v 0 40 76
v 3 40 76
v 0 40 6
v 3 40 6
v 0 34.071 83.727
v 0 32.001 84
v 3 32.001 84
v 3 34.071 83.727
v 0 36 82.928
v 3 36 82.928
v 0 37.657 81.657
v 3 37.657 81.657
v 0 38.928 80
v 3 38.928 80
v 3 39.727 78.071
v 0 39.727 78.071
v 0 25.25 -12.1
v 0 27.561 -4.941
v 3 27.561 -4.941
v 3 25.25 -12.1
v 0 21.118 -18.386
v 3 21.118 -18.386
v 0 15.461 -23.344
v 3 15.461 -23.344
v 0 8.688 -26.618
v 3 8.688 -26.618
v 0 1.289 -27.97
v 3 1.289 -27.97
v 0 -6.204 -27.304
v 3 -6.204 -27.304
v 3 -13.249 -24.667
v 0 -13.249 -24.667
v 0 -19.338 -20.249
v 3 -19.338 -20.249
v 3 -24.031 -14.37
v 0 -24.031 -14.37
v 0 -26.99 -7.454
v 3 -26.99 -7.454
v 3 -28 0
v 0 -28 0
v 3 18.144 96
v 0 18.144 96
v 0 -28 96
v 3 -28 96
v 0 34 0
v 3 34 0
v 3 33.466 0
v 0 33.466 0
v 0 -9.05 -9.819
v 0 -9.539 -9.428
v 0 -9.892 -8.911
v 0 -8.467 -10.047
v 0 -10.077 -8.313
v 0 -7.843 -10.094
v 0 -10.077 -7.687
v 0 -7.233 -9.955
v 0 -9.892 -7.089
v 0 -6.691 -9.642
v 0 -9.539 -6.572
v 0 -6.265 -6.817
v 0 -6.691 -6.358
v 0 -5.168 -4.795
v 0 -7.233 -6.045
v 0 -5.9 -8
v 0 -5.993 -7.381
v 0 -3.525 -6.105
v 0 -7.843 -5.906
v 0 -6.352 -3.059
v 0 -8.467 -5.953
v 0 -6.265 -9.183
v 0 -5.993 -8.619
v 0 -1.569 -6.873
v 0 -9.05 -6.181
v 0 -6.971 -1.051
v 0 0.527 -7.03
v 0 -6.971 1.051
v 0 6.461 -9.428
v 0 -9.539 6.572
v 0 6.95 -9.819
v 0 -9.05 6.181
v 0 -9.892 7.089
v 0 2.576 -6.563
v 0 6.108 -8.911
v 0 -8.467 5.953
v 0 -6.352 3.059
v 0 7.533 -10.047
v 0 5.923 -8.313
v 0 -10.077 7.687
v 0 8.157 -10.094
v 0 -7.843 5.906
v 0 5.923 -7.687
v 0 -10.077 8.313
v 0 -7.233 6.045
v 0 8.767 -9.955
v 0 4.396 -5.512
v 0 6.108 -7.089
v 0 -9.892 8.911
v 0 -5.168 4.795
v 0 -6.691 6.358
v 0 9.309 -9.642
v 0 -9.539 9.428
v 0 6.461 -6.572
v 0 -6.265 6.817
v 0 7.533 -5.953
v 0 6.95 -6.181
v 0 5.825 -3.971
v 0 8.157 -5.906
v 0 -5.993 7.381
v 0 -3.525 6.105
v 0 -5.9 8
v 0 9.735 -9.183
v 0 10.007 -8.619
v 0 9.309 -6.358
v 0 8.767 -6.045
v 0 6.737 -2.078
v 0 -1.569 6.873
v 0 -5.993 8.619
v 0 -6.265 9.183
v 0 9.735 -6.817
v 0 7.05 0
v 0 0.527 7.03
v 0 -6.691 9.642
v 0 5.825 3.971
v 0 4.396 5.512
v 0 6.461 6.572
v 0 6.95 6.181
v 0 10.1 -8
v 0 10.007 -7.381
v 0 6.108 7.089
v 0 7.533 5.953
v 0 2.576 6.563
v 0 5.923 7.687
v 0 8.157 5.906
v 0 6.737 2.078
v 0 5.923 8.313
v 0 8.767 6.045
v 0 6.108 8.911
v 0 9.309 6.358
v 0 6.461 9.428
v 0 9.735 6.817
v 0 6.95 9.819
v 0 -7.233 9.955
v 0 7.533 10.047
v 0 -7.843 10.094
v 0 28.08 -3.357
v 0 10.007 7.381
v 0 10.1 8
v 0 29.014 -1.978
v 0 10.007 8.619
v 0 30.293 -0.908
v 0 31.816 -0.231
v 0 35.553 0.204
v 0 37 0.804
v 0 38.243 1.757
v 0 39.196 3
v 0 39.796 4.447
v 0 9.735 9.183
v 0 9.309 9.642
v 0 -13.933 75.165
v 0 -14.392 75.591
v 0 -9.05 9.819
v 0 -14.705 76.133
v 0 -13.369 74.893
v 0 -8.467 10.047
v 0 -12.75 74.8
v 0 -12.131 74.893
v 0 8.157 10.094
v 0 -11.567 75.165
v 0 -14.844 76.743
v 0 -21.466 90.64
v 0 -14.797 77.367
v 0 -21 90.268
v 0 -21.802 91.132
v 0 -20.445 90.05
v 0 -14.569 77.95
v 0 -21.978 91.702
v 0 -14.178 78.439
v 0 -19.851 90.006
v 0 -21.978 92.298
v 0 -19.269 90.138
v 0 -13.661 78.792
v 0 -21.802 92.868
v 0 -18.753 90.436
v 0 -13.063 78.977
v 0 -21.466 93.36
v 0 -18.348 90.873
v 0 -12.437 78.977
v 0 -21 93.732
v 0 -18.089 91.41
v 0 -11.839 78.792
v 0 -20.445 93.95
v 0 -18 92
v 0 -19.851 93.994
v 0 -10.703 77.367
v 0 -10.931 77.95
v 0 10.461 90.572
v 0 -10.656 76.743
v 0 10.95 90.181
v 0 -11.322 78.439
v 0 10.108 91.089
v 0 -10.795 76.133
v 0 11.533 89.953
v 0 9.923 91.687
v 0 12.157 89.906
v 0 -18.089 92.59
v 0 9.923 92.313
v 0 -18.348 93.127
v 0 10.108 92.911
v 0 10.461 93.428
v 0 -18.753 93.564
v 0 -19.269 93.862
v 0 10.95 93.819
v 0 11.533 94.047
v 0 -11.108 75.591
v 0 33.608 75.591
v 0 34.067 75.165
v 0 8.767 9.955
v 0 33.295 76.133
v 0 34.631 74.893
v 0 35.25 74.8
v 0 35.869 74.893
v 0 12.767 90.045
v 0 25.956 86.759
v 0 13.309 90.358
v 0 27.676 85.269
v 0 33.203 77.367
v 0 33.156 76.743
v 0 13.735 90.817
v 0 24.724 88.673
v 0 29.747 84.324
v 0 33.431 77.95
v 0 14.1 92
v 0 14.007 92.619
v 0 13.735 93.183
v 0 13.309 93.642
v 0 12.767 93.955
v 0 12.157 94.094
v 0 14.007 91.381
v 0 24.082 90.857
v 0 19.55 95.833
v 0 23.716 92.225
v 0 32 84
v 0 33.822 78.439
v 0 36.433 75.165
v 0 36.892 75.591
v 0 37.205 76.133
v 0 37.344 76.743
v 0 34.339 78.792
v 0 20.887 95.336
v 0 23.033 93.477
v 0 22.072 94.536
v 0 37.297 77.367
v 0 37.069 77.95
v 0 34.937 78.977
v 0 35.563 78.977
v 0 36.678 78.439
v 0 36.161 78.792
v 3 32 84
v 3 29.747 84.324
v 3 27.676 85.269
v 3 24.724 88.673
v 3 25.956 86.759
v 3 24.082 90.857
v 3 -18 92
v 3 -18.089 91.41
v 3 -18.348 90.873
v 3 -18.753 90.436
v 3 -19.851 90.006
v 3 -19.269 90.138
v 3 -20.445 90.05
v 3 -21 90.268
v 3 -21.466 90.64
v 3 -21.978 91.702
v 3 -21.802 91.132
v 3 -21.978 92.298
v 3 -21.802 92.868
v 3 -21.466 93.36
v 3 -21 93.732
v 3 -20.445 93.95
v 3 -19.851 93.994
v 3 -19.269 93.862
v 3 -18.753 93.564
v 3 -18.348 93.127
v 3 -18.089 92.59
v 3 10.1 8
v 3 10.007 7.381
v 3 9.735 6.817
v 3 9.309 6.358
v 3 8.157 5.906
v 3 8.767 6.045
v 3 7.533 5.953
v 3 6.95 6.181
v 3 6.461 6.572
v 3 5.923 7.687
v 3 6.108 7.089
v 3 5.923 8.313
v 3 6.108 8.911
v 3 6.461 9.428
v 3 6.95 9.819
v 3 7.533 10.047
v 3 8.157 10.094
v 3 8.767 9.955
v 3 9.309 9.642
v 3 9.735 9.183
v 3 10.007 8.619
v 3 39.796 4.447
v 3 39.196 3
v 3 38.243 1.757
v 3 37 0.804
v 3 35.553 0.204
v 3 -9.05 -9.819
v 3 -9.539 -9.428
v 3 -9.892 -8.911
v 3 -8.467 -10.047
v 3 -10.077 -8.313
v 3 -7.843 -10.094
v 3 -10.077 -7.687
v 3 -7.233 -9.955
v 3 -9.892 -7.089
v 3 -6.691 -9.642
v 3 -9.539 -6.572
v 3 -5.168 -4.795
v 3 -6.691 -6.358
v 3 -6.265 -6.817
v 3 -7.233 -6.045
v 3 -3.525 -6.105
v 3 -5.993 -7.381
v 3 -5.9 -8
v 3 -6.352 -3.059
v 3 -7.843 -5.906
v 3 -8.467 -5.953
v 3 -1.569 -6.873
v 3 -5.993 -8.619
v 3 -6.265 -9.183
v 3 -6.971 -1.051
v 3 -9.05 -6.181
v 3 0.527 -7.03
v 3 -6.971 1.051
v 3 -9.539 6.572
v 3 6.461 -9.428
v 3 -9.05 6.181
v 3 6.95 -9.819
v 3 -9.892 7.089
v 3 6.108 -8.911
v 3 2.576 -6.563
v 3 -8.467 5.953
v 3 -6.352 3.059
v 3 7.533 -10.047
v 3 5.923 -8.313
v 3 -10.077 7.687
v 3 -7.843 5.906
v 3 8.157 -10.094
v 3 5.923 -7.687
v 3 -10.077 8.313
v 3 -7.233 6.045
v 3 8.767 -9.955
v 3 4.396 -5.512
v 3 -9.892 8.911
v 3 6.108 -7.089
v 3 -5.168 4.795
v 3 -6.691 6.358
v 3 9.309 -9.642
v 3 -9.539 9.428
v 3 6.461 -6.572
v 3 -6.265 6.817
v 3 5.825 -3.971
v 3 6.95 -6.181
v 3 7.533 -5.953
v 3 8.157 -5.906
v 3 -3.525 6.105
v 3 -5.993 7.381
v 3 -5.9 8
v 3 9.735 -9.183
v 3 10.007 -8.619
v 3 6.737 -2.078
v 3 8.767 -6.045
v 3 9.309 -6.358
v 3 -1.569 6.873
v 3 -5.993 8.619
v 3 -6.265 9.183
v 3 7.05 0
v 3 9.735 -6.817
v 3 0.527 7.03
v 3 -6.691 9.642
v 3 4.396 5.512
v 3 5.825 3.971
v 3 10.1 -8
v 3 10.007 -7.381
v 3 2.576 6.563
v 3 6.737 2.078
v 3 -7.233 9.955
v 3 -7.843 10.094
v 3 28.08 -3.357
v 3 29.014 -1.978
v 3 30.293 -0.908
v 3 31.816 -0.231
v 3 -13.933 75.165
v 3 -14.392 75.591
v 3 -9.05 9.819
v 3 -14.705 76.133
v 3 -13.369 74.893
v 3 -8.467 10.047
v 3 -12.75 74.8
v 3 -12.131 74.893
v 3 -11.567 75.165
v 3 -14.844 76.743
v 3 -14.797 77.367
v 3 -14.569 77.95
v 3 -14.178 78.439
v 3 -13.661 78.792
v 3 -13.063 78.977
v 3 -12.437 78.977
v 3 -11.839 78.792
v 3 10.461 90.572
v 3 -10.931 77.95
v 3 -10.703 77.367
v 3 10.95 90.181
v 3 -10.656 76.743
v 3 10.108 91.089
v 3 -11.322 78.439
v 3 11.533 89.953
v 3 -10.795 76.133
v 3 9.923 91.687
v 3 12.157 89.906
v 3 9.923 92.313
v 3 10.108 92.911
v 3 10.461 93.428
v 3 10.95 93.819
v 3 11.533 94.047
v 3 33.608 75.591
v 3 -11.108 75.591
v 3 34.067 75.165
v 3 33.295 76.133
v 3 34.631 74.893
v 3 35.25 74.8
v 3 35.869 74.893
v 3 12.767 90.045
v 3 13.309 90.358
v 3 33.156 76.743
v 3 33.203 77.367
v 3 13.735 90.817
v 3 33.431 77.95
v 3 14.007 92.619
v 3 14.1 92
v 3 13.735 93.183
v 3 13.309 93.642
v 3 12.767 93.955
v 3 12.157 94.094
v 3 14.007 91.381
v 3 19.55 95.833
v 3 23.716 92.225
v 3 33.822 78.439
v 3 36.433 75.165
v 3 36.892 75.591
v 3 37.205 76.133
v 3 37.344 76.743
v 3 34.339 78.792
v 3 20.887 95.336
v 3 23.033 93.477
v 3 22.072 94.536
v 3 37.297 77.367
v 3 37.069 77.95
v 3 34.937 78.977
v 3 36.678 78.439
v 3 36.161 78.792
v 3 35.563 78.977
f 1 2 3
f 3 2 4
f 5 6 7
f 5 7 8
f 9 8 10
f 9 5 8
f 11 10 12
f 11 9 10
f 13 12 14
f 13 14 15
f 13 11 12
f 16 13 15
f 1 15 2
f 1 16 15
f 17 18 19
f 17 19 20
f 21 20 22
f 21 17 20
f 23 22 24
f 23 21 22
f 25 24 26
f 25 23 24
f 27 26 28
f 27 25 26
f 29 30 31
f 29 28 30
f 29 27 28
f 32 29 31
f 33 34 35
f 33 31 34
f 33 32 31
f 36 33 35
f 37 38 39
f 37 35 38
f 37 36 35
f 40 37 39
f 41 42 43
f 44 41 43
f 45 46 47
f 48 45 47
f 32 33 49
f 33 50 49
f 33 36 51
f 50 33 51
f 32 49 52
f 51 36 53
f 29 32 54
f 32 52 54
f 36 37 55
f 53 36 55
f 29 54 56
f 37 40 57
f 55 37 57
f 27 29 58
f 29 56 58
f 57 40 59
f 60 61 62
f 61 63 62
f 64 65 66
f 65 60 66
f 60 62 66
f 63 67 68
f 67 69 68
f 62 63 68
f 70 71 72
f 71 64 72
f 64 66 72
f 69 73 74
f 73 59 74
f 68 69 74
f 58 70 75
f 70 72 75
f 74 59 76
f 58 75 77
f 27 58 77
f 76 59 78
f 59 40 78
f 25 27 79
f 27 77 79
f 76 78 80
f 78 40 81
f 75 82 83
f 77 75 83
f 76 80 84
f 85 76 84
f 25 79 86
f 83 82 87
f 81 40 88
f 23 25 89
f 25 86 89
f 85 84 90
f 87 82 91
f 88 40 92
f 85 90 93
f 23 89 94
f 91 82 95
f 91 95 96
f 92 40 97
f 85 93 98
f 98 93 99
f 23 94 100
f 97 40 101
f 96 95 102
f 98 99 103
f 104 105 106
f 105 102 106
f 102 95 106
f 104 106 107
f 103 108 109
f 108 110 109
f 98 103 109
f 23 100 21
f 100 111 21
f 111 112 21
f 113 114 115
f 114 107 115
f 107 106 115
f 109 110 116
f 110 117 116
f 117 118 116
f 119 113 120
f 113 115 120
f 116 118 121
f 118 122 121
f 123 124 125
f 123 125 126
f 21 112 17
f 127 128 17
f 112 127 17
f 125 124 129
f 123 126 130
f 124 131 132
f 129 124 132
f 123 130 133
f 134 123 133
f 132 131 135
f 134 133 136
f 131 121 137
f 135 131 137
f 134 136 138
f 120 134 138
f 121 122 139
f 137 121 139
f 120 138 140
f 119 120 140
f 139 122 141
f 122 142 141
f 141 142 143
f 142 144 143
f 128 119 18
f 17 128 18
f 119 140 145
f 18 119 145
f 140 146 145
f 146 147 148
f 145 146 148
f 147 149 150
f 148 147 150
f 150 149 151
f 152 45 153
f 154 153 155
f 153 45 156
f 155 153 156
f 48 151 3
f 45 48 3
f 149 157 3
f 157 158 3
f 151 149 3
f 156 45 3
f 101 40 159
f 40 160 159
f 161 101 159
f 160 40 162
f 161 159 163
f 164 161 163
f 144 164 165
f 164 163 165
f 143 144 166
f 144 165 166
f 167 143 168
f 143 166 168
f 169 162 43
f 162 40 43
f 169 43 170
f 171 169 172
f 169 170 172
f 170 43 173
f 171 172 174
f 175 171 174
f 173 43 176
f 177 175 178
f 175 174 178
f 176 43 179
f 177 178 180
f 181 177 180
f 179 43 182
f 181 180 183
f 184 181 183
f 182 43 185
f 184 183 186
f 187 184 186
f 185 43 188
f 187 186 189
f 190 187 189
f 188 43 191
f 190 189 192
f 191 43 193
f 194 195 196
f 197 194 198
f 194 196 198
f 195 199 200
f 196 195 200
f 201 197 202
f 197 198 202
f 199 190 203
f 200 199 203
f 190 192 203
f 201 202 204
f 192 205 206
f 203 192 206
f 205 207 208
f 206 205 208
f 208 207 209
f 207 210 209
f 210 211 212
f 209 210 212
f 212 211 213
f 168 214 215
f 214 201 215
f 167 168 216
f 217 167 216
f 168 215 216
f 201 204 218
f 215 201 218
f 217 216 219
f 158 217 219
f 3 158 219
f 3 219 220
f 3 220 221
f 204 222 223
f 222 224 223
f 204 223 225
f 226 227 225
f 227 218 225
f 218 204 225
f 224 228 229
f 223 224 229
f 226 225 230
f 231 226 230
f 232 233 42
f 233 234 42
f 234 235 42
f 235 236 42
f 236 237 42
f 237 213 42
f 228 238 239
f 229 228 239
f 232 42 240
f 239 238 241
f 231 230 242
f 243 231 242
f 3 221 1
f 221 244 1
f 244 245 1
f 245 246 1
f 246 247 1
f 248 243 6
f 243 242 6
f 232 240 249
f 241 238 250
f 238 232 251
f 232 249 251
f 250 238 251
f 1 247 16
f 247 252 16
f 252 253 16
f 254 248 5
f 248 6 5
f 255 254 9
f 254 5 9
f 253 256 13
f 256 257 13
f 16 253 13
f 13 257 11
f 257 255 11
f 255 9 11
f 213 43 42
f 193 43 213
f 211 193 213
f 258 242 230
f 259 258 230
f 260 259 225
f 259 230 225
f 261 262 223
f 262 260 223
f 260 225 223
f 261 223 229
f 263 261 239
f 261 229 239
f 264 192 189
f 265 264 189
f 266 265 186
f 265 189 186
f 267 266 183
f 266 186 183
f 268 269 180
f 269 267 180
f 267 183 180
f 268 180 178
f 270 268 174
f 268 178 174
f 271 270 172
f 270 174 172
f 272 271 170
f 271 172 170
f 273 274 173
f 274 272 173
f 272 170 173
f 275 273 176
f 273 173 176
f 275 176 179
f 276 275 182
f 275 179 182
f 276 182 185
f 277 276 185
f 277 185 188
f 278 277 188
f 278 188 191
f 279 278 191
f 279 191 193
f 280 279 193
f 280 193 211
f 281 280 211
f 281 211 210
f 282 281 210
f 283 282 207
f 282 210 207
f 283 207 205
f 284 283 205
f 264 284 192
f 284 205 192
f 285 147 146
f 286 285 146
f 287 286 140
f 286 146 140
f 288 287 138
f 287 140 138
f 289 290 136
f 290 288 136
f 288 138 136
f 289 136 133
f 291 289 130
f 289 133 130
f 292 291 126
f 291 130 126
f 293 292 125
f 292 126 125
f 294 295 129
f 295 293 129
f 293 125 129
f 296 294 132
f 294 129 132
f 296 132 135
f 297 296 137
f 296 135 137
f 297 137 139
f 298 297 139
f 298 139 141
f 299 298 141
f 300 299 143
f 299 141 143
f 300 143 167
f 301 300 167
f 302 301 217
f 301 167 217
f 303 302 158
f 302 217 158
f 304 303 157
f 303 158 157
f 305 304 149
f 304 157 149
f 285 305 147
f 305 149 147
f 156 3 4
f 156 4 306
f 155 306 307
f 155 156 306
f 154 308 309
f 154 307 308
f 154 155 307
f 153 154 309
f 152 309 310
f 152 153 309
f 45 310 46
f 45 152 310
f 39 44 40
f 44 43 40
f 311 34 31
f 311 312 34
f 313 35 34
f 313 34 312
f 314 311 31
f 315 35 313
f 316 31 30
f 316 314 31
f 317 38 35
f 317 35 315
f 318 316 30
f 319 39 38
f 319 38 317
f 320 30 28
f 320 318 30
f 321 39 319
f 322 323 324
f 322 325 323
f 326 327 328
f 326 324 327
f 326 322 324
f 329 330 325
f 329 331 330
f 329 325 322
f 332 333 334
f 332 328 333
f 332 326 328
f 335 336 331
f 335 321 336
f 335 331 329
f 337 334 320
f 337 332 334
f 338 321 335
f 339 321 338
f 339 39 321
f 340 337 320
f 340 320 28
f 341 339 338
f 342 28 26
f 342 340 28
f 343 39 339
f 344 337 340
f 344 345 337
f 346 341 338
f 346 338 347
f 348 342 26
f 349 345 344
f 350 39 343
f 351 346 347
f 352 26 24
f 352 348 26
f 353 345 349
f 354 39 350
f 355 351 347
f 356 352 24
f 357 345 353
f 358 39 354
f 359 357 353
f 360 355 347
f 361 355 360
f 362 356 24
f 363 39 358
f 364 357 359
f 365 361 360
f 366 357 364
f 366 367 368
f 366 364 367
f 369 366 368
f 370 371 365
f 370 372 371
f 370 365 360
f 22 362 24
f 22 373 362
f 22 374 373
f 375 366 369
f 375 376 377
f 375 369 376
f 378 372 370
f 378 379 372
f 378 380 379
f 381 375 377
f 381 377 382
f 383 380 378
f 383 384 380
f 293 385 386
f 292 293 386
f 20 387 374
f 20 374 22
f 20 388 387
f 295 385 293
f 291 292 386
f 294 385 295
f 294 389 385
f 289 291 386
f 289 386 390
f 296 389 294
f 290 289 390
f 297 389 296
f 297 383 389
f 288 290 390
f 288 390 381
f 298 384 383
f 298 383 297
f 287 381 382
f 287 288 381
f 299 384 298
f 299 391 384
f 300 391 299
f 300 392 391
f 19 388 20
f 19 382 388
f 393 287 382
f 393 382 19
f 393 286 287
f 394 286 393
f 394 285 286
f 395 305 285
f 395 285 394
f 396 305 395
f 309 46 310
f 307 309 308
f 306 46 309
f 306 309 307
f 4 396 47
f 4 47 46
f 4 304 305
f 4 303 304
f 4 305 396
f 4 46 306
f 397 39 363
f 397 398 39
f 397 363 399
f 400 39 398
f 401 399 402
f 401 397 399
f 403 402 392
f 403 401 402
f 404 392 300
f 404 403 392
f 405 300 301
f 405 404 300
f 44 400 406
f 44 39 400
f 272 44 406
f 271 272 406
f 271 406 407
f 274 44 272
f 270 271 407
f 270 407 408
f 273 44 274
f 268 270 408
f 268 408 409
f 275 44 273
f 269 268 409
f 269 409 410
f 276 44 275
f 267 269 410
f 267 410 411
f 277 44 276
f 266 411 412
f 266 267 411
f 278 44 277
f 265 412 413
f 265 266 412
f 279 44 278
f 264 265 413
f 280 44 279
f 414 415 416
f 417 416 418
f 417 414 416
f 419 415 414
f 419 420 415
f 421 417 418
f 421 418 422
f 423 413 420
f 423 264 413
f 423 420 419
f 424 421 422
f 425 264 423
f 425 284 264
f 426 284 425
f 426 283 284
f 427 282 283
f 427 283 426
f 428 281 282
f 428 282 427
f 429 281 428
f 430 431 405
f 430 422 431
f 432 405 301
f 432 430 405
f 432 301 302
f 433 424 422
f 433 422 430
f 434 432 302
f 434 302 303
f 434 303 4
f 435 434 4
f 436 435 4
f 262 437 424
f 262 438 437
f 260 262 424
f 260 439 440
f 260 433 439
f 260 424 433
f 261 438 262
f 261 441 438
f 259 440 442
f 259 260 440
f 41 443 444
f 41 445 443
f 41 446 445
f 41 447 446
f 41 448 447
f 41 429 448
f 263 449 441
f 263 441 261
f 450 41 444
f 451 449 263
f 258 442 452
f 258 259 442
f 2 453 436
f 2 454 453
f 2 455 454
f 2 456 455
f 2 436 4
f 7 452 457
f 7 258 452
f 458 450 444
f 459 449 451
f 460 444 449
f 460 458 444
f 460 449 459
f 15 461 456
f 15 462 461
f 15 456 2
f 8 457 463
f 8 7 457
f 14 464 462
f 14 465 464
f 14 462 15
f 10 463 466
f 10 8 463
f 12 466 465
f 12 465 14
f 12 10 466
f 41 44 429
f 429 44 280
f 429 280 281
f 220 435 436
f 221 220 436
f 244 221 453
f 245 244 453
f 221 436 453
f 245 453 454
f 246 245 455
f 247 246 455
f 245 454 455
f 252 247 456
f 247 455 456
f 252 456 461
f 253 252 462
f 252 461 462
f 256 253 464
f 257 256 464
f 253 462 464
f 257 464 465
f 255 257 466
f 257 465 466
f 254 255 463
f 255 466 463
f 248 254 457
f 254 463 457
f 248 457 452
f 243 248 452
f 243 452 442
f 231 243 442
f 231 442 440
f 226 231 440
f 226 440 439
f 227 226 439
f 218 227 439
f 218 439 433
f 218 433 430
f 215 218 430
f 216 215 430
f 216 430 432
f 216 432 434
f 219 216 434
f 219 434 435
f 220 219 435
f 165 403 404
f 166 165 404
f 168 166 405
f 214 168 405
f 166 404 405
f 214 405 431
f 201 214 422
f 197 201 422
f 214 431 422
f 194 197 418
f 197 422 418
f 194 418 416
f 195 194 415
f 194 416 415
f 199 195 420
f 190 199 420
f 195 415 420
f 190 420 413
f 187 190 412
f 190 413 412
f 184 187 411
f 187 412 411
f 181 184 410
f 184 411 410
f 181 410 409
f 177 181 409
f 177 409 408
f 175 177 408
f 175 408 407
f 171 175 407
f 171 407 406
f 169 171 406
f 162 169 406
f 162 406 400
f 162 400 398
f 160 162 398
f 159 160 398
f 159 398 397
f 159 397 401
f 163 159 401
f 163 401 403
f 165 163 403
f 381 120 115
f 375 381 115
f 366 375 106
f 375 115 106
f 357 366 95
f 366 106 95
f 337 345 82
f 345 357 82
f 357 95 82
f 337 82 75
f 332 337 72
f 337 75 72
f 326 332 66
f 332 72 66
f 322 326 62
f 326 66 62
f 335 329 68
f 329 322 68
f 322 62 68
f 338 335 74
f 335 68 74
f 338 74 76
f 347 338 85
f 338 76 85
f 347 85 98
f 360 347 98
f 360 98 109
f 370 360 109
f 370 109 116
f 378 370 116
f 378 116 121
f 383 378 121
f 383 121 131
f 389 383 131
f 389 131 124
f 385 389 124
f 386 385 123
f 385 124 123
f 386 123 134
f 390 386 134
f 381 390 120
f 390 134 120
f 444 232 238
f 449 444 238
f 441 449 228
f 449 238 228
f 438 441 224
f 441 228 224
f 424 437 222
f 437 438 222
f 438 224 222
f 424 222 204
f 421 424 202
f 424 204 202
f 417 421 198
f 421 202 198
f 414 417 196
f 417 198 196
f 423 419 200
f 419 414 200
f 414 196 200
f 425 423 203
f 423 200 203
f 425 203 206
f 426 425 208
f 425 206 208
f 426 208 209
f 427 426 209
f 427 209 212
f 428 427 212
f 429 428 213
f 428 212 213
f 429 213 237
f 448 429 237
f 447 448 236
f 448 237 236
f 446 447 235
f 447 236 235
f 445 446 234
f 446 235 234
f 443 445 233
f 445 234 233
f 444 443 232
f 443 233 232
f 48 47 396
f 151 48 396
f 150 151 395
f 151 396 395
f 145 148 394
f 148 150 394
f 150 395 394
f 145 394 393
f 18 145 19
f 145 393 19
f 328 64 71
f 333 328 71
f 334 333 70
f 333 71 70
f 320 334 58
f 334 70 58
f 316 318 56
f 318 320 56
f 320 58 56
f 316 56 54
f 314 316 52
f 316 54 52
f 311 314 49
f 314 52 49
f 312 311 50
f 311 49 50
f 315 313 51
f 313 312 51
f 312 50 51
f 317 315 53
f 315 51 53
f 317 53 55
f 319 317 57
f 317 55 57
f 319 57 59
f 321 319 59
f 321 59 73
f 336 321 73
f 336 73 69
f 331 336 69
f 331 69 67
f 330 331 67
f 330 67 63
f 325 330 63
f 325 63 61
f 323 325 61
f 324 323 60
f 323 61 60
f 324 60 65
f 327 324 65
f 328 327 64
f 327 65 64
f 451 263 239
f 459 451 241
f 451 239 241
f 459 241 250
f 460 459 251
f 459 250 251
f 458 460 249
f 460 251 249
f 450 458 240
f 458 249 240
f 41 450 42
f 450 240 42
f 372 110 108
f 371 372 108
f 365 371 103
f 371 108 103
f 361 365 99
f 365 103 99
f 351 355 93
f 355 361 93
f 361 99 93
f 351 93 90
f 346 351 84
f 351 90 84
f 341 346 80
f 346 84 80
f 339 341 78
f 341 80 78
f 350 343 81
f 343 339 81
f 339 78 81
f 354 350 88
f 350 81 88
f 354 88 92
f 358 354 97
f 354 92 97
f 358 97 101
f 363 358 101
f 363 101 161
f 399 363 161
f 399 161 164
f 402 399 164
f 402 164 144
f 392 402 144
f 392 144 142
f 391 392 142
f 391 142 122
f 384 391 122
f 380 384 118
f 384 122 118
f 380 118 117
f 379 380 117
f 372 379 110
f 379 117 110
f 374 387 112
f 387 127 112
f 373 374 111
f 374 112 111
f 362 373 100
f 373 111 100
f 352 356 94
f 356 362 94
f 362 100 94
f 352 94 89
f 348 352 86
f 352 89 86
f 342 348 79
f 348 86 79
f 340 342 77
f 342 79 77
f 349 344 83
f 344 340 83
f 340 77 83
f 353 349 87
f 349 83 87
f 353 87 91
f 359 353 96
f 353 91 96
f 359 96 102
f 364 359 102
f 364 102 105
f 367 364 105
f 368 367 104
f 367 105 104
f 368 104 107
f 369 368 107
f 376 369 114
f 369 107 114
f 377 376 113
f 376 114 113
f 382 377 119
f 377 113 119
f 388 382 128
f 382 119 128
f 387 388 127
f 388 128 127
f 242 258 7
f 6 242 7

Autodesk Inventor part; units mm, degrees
ref_plane "YZ Plane" through (0, 0, 0) normal (1, 0, 0) x (0, 1, 0)
ref_plane "XZ Plane" through (0, 0, 0) normal (0, 1, 0) x (-1, 0, 0)
ref_plane "XY Plane" through (0, 0, 0) normal (0, 0, 1) x (1, 0, 0)
sketch "Sketch1" plane through (0, 0, 0) normal (1, 0, 0) x (0, 1, 0)
  arc A0 (-28, 0) -> (28, 0) centre (0, 0) ccw
  line L0 (-28, 0) -> (28, 0) construction
  line L1 (28, 0) -> (28, 96)
  line L2 (28, 96) -> (-28, 96)
  line L3 (-28, 96) -> (-28, 0)
  circle A1 centre (0, 0) radius 7.05
  circle A2 centre (8, 8) radius 2.1
  circle A3 centre (-8, 8) radius 2.1
  circle A4 centre (-8, -8) radius 2.1
  circle A5 centre (8, -8) radius 2.1
  circle A6 centre (12, 92) radius 2.1
  line L4 (0, 96) -> (0, 0) construction
  circle A7 centre (-20, 92) radius 2
  dimension "d0" = 28
  dimension "d1" = 96
  dimension "d2" = 14.1
  dimension "d3" = 4.2
  dimension "d4" = 8
  dimension "d5" = 8
  dimension "d8" = 360
  dimension "d10" = 4.2
  dimension "d11" = 12
  dimension "d12" = 4
  dimension "d43" = 4
  dimension "d44" = 32
extrude "Extrusion1" add sketch "Sketch1" along normal blind 3
sketch "Sketch2" plane through (3, 0, 0) normal (1, 0, 0) x (0, 0, -1)
  line L0 (-76.9, 35.5) -> (-76.9, -13) construction
  line L1 (-76.9, -13) -> (-76.9, 0) construction
  line L2 (-79.4, 35.25) -> (-74.4, 35.25) construction
  line L3 (-74.4, 35.25) -> (-74.4, -12.75) construction
  line L4 (-74.4, -12.75) -> (-79.4, -12.75) construction
  line L5 (-79.4, -12.75) -> (-79.4, 35.25) construction
  line L6 (-79.4, 35.25) -> (-74.4, -12.75) construction
  line L7 (-74.4, 35.25) -> (-79.4, -12.75) construction
  line L8 (0, 28) -> (-96, 28) projected
  line L9 (-96, 28) -> (-96, 40)
  line L10 (-96, 40) -> (0, 40)
  line L11 (0, 40) -> (0, 28)
  circle A0 centre (-76.9, 35.25) radius 2.1
  circle A1 centre (-76.9, -12.75) radius 2.1
  circle A2 centre (-92, 12) radius 2.1 projected
  point P0 (0, 0)
  point P1 (-76.9, 11.25)
  dimension "d17" = 48.5
  dimension "d18" = 13
  dimension "d19" = 5
  dimension "d20" = 48
  dimension "d22" = 12
  dimension "d24" = 4.2
  dimension "d31" = 4.2
  dimension "d34" = 15.1
extrude "Extrusion2" add sketch "Sketch2" against normal up to surface (3 mm away) contours L8 L9 L10 L11
fillet "Fillet1" radius 6 1 edges at (1.5, 28, 0)
fillet "Fillet2" radius 6 1 edges at (1.5, 40, 0)
extrude "Extrusion4" cut sketch "Sketch2" against normal through all contours A1
sketch "Sketch3" plane through (3, 0, 0) normal (1, 0, 0) x (0, 0, -1)
  line L0 (-96, -28) -> (-96, 40) projected
  line L1 (-6, 40) -> (-96, 40) projected
  line L2 (-96, 24) -> (-84, 24)
  line L3 (-84, 24) -> (-84, 40)
  point P0 (0, 0)
  dimension "d37" = 12
  dimension "d38" = 16
extrude "Extrusion5" cut sketch "Sketch3" against normal through all
fillet "Fillet3" radius 8 2 edges at (1.5, 24, 84) (1.5, 40, 84)
fillet "Fillet4" radius 6 1 edges at (1.5, 24, 96)
properties part number "EndEffectorStage1Plate" material "Aluminum 6061"
